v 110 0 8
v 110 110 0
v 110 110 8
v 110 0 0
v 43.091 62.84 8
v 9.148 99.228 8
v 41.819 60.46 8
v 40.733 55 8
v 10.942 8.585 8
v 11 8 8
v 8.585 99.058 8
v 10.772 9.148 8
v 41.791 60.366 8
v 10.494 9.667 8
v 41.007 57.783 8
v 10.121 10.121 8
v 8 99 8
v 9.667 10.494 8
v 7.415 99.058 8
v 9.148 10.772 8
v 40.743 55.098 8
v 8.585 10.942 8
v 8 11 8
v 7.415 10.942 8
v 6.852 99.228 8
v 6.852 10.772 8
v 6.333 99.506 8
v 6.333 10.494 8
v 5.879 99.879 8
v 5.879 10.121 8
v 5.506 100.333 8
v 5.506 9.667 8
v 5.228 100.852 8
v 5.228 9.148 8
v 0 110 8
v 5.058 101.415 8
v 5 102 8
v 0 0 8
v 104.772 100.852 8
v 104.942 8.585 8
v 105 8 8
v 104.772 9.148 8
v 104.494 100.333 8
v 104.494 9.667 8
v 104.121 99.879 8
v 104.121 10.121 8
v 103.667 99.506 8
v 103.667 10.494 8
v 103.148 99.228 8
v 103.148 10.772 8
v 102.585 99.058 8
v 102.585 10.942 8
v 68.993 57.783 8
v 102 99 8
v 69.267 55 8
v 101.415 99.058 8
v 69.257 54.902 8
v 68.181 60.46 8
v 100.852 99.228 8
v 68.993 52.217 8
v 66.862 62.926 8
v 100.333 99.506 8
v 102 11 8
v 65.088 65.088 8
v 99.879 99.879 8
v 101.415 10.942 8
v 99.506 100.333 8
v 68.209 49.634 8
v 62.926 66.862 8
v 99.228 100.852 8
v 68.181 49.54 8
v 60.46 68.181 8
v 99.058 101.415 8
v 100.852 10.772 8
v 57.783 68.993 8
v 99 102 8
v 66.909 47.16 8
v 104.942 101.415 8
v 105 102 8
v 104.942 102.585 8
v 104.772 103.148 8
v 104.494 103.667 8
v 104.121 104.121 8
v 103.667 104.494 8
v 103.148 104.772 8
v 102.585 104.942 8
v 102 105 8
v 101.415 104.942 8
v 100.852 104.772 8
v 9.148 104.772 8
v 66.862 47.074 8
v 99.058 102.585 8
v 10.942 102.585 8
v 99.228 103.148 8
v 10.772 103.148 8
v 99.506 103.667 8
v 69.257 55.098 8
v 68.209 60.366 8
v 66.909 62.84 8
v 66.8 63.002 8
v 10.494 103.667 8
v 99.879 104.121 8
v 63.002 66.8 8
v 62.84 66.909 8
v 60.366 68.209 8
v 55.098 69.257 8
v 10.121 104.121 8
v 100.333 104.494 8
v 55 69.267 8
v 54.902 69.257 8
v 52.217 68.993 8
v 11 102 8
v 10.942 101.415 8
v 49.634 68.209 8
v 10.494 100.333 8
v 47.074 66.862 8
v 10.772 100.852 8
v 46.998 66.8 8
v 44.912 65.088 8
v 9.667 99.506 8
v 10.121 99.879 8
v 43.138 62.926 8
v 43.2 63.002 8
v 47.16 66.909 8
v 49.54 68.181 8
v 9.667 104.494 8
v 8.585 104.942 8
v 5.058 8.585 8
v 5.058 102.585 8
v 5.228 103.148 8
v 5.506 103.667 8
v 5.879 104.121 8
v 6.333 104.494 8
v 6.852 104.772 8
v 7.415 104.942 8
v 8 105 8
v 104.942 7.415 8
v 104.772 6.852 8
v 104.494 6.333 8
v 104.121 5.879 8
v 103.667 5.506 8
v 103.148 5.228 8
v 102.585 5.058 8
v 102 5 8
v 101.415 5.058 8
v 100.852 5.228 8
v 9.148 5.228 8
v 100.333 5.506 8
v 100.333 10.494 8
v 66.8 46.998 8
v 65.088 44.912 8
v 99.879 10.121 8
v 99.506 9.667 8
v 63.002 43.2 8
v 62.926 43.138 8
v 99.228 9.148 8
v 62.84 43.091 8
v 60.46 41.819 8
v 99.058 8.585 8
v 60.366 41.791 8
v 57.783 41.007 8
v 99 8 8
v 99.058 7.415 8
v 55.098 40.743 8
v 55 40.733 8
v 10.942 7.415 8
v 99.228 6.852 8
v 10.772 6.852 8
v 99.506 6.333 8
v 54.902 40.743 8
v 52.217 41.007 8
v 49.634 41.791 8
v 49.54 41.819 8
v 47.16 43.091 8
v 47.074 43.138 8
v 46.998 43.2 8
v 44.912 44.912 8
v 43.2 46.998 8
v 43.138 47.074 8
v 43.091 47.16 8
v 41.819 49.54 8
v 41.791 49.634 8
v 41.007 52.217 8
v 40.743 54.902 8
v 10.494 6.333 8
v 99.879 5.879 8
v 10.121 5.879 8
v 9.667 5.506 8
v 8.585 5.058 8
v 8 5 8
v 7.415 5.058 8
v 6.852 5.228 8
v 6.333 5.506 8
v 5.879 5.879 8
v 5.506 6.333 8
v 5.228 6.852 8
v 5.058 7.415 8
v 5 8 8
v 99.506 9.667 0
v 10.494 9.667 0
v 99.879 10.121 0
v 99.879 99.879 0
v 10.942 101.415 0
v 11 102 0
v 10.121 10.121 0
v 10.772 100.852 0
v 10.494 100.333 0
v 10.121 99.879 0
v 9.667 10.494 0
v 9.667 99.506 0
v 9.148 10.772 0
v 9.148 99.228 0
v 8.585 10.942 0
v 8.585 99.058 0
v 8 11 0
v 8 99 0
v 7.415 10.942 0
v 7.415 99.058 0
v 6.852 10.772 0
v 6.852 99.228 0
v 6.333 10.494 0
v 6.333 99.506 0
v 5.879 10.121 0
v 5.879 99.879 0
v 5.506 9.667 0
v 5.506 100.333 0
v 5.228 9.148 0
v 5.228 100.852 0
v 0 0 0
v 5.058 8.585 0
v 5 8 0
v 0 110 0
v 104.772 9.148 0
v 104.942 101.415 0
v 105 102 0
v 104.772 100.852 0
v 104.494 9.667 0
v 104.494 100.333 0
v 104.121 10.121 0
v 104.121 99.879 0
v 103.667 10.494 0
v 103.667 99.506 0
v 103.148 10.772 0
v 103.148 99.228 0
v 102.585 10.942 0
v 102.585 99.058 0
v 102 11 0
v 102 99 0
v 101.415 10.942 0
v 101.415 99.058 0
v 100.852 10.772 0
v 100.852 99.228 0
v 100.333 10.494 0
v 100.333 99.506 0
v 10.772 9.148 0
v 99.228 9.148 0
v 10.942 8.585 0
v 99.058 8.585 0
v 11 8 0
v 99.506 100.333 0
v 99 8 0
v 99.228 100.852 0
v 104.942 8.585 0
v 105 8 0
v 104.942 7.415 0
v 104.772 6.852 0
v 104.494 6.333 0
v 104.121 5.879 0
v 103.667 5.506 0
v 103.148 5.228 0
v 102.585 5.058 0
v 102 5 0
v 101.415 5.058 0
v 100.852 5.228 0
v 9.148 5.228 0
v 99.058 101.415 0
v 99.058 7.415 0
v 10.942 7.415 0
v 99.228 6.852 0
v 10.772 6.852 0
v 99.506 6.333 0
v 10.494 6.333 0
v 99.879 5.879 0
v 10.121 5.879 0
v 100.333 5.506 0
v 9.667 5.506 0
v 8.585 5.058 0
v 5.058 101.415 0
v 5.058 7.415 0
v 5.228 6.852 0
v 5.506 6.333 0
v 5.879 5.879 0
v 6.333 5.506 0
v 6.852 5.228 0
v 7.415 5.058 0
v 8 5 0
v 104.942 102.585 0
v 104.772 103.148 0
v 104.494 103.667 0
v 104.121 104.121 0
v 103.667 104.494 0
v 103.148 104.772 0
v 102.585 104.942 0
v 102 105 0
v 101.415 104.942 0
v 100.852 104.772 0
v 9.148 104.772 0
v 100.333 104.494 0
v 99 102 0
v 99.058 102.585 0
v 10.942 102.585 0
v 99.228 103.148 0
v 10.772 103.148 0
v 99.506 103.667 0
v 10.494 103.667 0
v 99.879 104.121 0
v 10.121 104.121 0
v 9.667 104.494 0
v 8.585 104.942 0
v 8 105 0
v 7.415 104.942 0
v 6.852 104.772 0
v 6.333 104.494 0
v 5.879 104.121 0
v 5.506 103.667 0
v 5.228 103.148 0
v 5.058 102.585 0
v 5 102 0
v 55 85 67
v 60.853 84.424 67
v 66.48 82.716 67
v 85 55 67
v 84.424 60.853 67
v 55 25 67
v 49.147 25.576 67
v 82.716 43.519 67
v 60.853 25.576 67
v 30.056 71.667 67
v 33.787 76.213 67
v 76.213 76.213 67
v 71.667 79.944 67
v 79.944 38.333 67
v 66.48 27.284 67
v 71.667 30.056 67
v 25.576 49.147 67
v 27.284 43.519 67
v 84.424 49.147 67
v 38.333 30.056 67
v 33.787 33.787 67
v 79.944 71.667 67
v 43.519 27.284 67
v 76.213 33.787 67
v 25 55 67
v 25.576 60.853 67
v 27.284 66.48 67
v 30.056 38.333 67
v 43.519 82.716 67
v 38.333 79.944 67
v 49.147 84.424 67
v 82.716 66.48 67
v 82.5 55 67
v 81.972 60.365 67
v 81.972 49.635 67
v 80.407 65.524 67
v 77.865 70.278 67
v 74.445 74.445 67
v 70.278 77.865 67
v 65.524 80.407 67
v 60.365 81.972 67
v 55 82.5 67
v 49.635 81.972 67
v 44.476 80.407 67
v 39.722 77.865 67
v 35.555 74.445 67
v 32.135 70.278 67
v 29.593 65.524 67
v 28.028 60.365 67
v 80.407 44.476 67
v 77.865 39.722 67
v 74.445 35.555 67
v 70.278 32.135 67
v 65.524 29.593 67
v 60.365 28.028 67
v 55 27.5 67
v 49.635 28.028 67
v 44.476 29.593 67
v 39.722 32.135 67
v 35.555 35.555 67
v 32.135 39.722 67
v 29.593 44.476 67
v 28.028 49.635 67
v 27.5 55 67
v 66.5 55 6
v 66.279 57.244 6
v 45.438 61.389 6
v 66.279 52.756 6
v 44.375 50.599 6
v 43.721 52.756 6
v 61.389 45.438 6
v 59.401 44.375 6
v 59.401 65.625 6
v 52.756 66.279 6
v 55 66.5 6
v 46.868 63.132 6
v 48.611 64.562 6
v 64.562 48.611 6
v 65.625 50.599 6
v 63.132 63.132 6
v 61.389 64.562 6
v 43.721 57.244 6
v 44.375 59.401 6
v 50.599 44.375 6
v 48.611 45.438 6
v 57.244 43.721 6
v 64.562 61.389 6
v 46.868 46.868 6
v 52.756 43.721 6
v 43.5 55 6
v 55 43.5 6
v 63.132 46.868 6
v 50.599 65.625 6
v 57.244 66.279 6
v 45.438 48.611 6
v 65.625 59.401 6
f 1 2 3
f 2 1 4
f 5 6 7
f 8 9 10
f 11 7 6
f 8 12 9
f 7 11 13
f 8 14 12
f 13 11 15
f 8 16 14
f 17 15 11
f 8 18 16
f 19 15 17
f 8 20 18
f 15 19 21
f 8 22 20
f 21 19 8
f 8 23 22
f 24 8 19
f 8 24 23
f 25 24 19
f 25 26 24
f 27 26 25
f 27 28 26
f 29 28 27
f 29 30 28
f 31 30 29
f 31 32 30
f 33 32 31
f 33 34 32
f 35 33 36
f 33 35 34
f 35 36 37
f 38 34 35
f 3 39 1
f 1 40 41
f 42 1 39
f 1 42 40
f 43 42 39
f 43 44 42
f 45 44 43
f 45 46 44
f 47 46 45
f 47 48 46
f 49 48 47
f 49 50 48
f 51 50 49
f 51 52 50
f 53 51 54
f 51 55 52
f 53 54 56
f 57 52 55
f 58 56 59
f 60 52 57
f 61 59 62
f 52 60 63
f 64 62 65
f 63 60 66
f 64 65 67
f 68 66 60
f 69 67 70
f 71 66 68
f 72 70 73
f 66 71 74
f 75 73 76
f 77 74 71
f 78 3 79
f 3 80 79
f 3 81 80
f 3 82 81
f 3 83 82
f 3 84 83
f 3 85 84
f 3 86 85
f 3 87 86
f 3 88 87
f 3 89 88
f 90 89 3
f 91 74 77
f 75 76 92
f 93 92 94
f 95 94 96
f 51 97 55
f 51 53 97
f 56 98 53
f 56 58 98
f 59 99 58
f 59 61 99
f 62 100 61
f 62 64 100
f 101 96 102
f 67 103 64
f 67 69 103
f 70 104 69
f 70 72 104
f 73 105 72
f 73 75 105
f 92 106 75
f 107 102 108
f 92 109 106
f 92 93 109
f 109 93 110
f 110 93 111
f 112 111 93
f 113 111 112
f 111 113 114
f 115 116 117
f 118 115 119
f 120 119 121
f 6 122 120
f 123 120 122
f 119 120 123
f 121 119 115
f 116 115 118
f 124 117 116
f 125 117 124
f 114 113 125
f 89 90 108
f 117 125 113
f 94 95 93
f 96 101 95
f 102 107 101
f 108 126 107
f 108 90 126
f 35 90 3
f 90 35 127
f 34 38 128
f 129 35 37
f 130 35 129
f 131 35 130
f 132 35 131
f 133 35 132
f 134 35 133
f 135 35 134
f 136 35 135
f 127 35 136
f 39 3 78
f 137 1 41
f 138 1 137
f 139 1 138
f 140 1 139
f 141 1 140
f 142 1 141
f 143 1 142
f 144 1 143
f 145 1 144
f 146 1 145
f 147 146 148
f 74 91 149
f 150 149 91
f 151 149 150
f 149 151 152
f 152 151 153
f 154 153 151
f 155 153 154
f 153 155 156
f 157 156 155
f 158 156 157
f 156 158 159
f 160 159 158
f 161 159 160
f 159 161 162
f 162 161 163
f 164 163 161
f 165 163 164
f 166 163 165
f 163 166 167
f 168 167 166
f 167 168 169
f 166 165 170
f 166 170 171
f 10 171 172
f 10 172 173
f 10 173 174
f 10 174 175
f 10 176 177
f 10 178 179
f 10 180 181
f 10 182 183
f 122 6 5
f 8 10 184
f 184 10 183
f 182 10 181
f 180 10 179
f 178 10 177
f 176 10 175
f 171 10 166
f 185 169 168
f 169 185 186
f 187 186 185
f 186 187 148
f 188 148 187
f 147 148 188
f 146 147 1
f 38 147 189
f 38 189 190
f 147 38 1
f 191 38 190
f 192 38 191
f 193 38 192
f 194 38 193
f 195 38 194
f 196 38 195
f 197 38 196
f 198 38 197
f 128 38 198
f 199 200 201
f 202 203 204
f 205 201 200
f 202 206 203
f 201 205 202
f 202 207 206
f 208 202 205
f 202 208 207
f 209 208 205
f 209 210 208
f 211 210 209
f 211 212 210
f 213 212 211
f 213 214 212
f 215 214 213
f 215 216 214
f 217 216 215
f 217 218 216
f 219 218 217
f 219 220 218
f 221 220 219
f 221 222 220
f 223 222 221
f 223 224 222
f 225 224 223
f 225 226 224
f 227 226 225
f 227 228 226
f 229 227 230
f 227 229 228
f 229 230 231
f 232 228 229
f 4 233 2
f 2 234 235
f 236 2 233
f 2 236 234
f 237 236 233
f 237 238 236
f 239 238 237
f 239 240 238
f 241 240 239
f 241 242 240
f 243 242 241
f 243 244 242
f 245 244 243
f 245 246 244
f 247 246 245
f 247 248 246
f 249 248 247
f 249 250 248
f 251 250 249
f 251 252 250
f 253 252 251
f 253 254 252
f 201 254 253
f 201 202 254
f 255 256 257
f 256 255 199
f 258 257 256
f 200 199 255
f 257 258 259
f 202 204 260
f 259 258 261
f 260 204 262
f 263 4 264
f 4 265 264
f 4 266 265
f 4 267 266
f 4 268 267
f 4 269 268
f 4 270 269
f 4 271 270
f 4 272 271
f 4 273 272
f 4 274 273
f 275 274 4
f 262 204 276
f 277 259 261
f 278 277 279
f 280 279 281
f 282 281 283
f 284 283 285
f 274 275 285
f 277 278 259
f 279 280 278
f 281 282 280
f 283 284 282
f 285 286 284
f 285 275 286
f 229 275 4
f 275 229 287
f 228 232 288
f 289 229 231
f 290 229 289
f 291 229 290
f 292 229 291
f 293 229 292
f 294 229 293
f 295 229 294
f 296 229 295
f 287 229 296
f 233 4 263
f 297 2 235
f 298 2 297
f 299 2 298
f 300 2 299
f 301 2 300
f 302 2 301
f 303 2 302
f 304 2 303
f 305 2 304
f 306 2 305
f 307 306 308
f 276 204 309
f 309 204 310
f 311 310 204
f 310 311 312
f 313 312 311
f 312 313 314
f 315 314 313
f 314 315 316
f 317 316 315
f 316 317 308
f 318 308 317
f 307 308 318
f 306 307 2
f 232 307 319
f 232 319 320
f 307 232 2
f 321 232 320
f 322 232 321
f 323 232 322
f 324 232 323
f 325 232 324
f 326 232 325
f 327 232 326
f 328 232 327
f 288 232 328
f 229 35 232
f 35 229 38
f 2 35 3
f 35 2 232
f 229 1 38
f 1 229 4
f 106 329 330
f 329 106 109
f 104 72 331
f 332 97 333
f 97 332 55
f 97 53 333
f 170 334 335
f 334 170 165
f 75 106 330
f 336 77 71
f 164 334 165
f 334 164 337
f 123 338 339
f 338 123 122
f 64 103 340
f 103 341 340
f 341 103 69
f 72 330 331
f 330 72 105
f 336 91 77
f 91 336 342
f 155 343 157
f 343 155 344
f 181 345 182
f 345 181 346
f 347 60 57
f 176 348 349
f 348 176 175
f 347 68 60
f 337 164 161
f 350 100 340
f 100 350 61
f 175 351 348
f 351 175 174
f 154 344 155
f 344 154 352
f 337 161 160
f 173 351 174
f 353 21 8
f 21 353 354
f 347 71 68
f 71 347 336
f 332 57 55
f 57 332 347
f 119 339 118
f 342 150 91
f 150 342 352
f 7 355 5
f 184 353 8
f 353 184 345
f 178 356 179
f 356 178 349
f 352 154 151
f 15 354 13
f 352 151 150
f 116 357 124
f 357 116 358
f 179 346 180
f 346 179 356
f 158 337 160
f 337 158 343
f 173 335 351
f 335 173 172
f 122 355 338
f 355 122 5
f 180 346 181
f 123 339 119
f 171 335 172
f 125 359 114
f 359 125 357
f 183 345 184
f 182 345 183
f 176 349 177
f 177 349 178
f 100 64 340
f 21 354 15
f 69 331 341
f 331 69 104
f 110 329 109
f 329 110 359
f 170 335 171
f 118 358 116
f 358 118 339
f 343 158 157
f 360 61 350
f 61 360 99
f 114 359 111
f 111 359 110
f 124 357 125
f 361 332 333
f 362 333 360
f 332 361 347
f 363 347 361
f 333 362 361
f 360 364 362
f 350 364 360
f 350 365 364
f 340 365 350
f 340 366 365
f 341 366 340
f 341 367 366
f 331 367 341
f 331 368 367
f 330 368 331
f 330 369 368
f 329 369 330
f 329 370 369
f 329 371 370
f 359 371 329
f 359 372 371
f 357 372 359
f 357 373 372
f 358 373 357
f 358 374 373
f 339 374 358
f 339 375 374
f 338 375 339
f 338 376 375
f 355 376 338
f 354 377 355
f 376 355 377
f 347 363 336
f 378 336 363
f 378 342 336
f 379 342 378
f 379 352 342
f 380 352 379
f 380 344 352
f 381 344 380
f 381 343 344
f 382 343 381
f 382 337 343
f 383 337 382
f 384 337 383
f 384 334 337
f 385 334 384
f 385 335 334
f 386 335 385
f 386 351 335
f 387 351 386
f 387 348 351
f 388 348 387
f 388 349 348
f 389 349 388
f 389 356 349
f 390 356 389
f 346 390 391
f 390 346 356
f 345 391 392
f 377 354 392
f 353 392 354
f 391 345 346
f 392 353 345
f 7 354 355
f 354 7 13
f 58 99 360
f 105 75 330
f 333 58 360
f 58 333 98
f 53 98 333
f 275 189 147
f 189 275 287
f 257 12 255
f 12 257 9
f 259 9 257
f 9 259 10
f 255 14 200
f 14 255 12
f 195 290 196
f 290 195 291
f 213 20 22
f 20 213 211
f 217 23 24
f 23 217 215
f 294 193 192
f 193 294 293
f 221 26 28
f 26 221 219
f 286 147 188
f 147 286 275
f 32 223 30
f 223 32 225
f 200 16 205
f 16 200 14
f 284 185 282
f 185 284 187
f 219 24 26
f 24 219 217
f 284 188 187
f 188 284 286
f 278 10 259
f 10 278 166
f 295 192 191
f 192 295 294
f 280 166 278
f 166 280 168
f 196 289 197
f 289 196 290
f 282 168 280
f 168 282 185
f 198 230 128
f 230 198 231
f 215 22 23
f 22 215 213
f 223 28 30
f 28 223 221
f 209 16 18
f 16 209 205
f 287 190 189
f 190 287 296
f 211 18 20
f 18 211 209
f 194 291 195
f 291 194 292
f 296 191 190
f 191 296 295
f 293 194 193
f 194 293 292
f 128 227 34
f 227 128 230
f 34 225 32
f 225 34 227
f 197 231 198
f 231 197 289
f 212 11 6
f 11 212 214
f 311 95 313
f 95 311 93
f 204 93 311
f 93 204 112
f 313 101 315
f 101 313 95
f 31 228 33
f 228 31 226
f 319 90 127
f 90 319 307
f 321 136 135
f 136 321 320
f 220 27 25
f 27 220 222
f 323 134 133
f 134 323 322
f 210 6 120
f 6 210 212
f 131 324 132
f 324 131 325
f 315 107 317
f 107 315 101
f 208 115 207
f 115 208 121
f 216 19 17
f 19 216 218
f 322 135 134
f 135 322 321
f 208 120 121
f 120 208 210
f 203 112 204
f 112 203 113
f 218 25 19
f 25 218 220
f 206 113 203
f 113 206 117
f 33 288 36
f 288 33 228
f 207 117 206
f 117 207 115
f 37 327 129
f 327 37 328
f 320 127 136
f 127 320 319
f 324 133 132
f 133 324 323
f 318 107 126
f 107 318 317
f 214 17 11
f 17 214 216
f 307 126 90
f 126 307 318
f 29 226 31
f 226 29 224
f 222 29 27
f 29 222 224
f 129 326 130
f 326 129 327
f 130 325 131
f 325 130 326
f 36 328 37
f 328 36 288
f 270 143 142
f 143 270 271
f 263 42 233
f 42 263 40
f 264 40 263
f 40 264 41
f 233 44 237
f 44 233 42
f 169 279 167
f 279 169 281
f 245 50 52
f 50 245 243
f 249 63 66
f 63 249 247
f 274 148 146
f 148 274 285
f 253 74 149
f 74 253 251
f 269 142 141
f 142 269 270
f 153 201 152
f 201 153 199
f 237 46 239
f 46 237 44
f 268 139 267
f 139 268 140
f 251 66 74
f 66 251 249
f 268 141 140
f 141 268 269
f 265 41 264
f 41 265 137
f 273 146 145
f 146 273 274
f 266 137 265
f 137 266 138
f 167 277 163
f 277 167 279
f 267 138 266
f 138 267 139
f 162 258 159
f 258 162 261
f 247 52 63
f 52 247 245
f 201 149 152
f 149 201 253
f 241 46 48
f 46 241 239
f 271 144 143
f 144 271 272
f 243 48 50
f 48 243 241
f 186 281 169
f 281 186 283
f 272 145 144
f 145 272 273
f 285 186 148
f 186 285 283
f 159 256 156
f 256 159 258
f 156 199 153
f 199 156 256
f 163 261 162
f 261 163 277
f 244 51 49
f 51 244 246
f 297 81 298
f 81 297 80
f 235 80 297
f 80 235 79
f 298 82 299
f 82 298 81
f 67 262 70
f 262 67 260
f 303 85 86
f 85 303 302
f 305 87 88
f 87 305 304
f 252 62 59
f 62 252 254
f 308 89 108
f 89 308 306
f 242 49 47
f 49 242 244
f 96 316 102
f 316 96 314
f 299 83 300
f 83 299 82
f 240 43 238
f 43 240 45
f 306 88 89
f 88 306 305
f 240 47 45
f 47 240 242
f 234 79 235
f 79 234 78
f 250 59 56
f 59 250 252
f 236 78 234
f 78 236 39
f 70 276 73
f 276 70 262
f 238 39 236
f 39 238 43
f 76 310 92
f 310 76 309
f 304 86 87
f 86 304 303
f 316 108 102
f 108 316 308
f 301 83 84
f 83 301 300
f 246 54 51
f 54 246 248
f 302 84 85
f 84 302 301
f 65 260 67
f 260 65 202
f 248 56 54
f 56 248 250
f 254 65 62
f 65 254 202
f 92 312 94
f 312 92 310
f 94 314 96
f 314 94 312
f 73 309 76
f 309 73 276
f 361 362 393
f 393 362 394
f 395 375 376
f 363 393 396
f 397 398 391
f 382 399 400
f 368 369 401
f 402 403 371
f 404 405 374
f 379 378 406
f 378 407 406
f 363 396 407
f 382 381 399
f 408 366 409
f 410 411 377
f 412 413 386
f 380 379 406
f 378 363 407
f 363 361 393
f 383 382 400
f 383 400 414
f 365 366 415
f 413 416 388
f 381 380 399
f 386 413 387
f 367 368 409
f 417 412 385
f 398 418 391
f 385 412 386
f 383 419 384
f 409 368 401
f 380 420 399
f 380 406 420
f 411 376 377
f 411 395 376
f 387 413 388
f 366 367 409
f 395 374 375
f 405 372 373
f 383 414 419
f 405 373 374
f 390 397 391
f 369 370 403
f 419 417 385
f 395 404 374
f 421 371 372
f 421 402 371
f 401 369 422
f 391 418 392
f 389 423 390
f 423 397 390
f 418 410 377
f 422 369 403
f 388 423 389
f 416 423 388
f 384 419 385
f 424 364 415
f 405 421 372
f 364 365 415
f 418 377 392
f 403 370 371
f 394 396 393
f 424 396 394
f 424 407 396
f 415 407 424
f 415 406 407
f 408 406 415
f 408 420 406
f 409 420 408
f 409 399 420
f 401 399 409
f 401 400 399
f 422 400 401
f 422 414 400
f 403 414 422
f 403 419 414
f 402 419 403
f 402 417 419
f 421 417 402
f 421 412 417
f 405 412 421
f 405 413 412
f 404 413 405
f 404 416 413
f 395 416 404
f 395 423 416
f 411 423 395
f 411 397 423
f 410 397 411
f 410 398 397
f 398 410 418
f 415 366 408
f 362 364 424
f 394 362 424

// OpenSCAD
$fn = 32;
// target_bbox: 110, 110, 67
// ----------------------------------------------------------------------
// Hopper: flanged with square flange
// ----------------------------------------------------------------------

// --- parameters (mm) ---
fl = 110;                 // flange side, X and Y
fl_t = 8;                 // flange thickness
cone_h = 60;              // cone height above the flange
top_d = 60;               // cone mouth diameter
bot_d = 28;               // cone spout diameter
wall = 2.5;               // cone wall thickness
hole_r = 3;               // flange hole radius
hole_in = 8;              // hole inset from the corners
fit_tol = 0.1;            // tolerance for press fits, mm
free_tol = 0.5;           // tolerance for clearance fits, mm

bore_d = bot_d - 2 * wall;  // spout bore diameter
total_h = fl_t + cone_h - 1;  // overall height

difference() {
  union() {
    cube([fl, fl, fl_t]);
    translate([fl / 2, fl / 2, fl_t - 1])
      cylinder(h = cone_h, d1 = bot_d, d2 = top_d);
  }
  translate([fl / 2, fl / 2, fl_t - 2])
    cylinder(h = cone_h + 1, d1 = bore_d, d2 = top_d - 2 * wall);
  for (sx = [0, 1], sy = [0, 1])
    translate([sx ? fl - hole_in : hole_in,
               sy ? fl - hole_in : hole_in, -1])
      cylinder(r = hole_r, h = fl_t + 2);
}
